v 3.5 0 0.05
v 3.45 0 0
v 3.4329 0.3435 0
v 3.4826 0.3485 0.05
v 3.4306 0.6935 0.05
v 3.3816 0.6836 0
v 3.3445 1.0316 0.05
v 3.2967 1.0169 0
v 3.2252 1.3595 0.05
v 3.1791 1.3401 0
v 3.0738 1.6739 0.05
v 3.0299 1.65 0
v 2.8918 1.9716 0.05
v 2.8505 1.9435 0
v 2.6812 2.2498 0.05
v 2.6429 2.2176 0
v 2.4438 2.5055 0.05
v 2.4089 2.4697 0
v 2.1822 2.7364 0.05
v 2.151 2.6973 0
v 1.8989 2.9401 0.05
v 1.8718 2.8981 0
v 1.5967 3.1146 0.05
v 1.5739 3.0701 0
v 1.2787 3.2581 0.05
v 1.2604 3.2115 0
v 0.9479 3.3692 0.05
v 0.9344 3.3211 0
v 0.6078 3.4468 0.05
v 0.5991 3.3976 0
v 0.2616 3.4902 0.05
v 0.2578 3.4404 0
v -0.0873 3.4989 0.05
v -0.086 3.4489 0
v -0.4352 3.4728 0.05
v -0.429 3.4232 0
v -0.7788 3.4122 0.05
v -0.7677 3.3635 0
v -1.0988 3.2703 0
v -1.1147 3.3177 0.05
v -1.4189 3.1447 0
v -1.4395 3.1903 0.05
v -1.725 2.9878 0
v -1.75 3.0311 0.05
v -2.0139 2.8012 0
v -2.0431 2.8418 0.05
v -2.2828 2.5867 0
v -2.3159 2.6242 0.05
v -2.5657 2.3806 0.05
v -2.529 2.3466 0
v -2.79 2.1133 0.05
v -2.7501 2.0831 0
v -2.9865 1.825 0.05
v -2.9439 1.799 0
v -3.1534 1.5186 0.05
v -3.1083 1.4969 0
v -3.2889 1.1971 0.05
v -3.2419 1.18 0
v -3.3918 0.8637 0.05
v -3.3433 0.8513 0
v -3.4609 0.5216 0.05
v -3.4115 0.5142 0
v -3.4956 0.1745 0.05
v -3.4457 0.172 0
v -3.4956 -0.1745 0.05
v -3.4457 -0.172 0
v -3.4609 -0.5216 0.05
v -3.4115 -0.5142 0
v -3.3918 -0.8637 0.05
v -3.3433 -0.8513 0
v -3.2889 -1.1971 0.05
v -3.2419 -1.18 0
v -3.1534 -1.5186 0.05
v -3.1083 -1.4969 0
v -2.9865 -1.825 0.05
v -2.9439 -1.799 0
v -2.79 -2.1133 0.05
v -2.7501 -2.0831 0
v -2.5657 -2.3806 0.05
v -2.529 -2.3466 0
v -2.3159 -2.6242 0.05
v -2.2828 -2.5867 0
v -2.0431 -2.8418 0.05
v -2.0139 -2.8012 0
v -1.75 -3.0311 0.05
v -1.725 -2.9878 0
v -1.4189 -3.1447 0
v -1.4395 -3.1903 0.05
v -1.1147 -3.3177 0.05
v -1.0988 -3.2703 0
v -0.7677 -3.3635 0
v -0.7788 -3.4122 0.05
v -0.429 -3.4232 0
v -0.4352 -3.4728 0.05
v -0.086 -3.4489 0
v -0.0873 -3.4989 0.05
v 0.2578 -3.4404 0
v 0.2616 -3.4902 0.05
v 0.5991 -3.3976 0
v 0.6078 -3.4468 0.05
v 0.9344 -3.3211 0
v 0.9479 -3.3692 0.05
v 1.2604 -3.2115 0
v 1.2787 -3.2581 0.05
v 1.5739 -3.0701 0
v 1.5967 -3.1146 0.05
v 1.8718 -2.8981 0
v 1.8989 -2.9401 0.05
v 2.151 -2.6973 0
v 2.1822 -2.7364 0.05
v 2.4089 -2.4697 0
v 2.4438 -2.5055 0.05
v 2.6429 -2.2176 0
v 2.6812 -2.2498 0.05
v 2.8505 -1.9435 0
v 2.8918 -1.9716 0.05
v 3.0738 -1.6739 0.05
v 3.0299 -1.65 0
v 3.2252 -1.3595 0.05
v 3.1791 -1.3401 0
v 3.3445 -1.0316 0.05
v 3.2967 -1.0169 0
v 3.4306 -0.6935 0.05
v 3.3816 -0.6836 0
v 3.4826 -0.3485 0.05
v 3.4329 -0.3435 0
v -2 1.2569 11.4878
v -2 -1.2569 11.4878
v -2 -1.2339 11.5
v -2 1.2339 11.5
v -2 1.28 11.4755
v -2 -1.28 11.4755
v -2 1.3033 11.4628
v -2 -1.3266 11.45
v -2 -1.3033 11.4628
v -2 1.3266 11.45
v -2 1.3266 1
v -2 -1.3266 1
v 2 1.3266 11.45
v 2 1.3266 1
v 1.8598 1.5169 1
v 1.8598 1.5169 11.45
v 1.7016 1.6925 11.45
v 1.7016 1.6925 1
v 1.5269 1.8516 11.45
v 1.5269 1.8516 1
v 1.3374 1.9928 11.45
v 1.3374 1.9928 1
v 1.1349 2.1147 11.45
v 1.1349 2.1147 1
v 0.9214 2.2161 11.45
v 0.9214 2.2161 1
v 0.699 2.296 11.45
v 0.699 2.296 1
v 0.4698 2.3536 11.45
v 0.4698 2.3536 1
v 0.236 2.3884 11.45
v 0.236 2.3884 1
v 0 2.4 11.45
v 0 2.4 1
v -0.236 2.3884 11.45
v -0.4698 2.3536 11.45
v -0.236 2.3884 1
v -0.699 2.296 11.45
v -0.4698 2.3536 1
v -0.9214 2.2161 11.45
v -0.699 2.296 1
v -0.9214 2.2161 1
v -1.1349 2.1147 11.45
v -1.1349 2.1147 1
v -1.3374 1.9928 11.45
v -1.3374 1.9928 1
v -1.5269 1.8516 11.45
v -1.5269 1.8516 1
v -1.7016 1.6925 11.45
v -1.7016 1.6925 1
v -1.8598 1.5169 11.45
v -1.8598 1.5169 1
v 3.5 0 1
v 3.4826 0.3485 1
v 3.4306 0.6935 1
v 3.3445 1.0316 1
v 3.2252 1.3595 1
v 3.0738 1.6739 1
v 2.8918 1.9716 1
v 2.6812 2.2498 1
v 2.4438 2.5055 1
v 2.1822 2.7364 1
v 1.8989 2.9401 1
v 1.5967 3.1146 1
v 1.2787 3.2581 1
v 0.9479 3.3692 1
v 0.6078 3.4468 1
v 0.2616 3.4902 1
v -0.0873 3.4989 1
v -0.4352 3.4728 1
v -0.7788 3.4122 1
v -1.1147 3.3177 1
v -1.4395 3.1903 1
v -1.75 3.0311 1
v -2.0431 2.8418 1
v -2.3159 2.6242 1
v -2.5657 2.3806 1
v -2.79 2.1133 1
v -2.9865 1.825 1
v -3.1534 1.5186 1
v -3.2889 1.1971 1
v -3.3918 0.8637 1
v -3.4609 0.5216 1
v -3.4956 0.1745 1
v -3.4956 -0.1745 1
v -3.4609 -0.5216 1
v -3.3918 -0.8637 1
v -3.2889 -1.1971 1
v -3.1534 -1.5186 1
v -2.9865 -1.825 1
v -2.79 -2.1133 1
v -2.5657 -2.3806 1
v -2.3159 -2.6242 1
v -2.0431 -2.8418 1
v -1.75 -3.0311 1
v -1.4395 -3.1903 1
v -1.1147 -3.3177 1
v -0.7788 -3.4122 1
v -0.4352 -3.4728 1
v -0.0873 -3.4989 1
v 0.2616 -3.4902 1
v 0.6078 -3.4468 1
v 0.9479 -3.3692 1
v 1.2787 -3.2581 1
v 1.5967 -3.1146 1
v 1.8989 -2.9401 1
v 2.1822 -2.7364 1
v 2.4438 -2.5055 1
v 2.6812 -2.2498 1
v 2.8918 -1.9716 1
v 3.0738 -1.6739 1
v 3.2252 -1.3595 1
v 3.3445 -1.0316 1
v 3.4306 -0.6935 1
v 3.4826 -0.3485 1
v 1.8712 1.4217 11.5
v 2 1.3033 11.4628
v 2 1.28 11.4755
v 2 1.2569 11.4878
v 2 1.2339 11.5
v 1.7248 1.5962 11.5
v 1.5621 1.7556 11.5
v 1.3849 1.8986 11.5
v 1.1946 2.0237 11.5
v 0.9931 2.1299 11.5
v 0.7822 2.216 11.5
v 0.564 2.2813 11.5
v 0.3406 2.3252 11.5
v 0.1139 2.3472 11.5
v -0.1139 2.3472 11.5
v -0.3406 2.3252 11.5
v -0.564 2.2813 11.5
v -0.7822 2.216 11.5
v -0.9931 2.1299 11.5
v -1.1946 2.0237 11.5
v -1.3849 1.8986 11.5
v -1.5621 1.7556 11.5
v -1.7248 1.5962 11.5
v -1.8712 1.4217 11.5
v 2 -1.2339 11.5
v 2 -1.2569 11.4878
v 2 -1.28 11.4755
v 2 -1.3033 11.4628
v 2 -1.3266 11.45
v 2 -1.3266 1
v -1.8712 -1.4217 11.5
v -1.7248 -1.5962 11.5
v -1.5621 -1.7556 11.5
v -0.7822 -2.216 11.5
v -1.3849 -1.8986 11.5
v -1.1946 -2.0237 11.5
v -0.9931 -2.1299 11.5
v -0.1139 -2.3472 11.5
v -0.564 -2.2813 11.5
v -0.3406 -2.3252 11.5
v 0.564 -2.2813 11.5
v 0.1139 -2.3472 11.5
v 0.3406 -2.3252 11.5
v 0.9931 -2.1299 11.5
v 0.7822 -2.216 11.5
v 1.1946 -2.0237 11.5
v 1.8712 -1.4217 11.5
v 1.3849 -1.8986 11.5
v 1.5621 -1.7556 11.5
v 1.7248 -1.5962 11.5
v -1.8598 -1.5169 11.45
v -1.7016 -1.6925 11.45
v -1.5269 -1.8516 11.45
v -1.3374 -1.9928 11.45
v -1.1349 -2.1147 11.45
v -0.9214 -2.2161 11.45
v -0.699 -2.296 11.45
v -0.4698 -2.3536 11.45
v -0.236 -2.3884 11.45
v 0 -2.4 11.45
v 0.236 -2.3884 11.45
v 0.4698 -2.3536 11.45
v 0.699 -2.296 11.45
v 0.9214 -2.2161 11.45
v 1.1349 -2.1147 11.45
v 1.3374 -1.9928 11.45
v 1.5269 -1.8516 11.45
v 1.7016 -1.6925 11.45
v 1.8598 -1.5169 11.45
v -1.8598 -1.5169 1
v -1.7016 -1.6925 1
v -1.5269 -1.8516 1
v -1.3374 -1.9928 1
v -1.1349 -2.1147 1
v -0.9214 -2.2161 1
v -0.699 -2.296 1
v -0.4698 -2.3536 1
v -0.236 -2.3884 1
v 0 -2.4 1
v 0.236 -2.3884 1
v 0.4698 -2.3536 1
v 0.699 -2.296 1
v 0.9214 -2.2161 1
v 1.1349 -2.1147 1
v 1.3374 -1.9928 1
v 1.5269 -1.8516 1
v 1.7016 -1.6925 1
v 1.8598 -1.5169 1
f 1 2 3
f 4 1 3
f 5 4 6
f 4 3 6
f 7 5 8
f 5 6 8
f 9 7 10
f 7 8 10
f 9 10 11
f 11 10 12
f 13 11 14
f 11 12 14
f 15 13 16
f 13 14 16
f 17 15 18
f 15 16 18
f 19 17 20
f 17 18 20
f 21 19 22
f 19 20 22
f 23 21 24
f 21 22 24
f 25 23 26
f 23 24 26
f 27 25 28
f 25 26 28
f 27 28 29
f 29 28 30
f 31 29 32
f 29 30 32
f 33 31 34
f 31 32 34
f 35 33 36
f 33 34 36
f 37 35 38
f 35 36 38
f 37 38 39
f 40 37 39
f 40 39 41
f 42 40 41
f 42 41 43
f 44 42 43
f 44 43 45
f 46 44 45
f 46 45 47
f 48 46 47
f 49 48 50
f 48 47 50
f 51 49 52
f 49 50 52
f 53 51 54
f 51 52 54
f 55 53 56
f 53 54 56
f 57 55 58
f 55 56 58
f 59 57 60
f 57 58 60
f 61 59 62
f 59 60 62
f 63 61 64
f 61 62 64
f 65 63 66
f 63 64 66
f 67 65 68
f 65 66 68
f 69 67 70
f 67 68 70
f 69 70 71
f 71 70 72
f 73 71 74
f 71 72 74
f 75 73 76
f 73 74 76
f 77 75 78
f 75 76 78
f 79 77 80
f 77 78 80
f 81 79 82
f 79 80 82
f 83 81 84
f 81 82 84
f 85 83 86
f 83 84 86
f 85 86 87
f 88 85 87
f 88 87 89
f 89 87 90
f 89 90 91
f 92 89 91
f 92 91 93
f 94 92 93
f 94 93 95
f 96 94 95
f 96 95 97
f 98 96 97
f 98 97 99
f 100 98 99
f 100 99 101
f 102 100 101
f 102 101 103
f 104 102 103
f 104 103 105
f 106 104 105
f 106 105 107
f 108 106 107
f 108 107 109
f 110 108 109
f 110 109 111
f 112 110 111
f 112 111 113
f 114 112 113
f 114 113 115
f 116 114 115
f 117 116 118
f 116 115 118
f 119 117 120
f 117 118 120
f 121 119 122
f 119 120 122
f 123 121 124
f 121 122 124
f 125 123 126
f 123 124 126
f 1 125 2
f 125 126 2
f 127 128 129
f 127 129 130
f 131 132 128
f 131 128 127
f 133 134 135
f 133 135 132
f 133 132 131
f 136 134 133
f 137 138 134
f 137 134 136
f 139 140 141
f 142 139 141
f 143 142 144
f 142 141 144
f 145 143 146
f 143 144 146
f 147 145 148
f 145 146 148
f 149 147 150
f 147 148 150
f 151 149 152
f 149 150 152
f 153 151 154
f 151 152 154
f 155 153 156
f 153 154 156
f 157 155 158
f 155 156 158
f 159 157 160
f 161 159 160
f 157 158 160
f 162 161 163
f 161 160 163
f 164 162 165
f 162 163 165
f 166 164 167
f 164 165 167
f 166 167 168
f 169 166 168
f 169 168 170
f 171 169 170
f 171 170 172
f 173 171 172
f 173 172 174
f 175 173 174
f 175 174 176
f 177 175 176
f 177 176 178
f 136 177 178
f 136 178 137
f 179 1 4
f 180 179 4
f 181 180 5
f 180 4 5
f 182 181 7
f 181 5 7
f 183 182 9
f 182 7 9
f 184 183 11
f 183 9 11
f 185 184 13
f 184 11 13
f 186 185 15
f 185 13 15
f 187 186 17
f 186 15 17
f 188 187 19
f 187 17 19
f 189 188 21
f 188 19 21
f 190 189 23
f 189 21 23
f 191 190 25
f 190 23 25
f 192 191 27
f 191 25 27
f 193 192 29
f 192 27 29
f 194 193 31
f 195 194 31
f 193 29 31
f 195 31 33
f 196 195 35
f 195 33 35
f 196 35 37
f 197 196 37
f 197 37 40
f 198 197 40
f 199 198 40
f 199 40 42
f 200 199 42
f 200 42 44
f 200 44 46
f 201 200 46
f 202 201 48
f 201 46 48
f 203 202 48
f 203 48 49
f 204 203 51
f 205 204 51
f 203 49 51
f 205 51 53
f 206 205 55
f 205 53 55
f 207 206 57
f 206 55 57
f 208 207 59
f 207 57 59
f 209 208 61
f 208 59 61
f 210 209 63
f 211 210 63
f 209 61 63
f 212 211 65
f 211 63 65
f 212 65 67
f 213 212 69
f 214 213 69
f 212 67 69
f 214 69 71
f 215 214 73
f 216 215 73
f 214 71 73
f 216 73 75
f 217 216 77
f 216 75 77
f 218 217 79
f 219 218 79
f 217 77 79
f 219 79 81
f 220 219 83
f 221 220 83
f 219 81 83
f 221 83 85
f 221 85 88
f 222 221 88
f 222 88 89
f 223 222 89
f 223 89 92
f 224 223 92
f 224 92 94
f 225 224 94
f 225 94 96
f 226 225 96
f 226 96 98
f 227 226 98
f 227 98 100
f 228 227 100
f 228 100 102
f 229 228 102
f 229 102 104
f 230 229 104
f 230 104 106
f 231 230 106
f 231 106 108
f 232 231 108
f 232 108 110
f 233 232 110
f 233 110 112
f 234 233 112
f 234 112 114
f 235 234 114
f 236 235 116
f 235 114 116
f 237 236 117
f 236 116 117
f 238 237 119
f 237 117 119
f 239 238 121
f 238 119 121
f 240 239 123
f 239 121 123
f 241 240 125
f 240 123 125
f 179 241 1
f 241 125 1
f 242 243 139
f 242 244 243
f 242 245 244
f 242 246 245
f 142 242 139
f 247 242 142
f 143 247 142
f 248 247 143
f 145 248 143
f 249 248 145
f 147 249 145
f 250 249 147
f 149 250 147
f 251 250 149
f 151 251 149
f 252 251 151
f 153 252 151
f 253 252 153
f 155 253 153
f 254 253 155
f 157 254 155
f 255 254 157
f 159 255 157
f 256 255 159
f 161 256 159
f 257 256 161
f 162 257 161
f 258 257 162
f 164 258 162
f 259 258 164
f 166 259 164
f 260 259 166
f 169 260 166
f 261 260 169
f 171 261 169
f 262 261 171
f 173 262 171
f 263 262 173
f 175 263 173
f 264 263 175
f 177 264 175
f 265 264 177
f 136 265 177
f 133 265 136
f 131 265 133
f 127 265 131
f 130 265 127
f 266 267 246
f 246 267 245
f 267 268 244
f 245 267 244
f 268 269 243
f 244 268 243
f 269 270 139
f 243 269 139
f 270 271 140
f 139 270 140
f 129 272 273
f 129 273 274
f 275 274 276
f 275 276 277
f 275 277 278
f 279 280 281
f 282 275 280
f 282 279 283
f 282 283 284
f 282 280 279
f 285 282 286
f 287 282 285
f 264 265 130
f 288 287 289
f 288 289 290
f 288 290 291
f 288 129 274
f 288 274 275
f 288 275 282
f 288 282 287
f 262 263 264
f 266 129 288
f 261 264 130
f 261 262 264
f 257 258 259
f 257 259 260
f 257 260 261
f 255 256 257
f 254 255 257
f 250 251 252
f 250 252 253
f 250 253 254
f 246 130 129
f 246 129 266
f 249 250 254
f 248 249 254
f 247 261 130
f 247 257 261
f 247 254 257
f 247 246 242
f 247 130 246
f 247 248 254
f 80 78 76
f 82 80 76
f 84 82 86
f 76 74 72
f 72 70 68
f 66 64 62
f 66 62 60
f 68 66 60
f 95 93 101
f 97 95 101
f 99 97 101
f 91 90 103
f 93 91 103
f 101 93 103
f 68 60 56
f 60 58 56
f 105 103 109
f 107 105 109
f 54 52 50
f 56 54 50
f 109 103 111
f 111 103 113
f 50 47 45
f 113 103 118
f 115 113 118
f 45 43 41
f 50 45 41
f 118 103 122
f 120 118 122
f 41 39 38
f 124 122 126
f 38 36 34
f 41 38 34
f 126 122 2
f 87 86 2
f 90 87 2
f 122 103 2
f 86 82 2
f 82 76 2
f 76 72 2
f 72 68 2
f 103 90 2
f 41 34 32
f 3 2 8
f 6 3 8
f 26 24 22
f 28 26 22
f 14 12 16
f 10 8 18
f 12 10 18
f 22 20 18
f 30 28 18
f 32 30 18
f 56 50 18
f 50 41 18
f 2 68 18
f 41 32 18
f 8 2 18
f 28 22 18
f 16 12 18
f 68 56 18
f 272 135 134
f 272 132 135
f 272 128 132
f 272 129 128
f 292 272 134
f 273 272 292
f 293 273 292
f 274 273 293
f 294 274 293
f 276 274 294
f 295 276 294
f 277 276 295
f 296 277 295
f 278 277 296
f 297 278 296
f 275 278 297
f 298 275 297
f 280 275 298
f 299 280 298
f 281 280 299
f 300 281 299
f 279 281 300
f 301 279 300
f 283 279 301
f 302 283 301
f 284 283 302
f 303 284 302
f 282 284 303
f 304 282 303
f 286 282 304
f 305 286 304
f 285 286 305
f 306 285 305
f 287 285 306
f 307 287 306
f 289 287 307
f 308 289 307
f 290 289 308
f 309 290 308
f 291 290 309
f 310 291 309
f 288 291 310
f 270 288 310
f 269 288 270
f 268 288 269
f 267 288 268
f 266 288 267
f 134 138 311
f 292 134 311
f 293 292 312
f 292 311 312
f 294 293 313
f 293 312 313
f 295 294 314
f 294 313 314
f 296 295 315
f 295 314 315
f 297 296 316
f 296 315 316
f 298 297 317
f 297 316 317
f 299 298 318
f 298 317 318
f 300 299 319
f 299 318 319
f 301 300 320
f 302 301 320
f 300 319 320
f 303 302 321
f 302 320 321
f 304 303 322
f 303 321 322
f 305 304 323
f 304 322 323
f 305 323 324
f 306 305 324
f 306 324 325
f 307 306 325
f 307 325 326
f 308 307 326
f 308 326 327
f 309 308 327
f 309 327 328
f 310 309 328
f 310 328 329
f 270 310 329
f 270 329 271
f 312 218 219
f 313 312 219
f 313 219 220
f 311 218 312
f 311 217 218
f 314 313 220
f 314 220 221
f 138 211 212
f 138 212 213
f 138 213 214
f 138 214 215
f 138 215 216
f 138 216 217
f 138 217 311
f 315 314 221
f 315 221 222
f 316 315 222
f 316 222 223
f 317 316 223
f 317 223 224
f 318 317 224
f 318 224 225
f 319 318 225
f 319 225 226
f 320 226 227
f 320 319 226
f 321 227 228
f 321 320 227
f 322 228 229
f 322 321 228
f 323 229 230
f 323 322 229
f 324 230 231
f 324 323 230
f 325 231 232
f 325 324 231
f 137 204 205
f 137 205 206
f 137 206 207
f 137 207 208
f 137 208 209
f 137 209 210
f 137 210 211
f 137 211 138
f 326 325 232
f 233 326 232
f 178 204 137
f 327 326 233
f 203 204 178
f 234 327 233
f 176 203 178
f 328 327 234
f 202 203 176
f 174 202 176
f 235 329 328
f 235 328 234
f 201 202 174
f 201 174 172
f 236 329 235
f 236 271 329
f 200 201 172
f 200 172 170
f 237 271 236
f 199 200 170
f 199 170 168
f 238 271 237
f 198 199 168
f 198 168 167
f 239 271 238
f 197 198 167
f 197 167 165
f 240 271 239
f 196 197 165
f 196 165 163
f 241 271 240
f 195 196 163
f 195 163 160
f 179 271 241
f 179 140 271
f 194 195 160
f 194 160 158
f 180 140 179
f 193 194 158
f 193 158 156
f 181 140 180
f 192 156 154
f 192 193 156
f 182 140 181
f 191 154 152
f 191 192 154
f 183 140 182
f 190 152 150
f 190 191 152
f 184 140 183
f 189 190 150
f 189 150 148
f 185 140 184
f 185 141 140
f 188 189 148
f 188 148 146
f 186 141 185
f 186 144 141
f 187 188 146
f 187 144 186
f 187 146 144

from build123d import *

# Parameters (mm, degrees)
F0_W     = 4
F0_H     = 2.6532998323
F1_DEPTH = 11.5
F0_R     = 3.5
F2_DEPTH = 1
F3_SIZE  = 0.05
F4_SIZE  = 0.05


with BuildPart() as f1:
    # F0 (on Top) → F1 (new body)
    with BuildSketch(Plane.XY):
        with BuildLine():
            Line((-2, 1.3266499161), (2, 1.3266499161))
            ThreePointArc((2, 1.3266499161), (0, 2.4), (-2, 1.3266499161))
        make_face()
        Rectangle(F0_W, F0_H)
        with BuildLine():
            ThreePointArc((-2, -1.3266499161), (0, -2.4), (2, -1.3266499161))
            Line((2, -1.3266499161), (-2, -1.3266499161))
        make_face()
    extrude(amount=F1_DEPTH)

    # F0 (on Top) → F2 (join)
    with BuildSketch(Plane.XY):
        Circle(F0_R)
        with BuildLine():
            ThreePointArc((2, 1.3266499161), (2.2978250586, 0.692820323), (2.4, 0))
            ThreePointArc((2.4, 0), (2.2978250586, -0.692820323), (2, -1.3266499161))
            ThreePointArc((2, -1.3266499161), (0, -2.4), (-2, -1.3266499161))
            ThreePointArc((-2, -1.3266499161), (-2.4, 0), (-2, 1.3266499161))
            ThreePointArc((-2, 1.3266499161), (0, 2.4), (2, 1.3266499161))
        make_face(mode=Mode.SUBTRACT)
        with BuildLine():
            ThreePointArc((2, -1.3266499161), (2.2978250586, -0.692820323), (2.4, 0))
            ThreePointArc((2.4, 0), (2.2978250586, 0.692820323), (2, 1.3266499161))
            Line((2, 1.3266499161), (2, -1.3266499161))
        make_face()
        with BuildLine():
            Line((-2, -1.3266499161), (-2, 1.3266499161))
            ThreePointArc((-2, 1.3266499161), (-2.4, 0), (-2, -1.3266499161))
        make_face()
    extrude(amount=F2_DEPTH)

    # F3
    f3_edges = [f1.edges().sort_by_distance(p)[0] for p in [
        (0, -2.4, 11.5),
        (0, 2.4, 11.5),
    ]]
    chamfer(f3_edges, length=F3_SIZE)

    # F4
    f4_edges = [f1.edges().sort_by_distance(p)[0] for p in [
        (-3.5, 0, 0),
    ]]
    chamfer(f4_edges, length=F4_SIZE)


solid = f1.part
